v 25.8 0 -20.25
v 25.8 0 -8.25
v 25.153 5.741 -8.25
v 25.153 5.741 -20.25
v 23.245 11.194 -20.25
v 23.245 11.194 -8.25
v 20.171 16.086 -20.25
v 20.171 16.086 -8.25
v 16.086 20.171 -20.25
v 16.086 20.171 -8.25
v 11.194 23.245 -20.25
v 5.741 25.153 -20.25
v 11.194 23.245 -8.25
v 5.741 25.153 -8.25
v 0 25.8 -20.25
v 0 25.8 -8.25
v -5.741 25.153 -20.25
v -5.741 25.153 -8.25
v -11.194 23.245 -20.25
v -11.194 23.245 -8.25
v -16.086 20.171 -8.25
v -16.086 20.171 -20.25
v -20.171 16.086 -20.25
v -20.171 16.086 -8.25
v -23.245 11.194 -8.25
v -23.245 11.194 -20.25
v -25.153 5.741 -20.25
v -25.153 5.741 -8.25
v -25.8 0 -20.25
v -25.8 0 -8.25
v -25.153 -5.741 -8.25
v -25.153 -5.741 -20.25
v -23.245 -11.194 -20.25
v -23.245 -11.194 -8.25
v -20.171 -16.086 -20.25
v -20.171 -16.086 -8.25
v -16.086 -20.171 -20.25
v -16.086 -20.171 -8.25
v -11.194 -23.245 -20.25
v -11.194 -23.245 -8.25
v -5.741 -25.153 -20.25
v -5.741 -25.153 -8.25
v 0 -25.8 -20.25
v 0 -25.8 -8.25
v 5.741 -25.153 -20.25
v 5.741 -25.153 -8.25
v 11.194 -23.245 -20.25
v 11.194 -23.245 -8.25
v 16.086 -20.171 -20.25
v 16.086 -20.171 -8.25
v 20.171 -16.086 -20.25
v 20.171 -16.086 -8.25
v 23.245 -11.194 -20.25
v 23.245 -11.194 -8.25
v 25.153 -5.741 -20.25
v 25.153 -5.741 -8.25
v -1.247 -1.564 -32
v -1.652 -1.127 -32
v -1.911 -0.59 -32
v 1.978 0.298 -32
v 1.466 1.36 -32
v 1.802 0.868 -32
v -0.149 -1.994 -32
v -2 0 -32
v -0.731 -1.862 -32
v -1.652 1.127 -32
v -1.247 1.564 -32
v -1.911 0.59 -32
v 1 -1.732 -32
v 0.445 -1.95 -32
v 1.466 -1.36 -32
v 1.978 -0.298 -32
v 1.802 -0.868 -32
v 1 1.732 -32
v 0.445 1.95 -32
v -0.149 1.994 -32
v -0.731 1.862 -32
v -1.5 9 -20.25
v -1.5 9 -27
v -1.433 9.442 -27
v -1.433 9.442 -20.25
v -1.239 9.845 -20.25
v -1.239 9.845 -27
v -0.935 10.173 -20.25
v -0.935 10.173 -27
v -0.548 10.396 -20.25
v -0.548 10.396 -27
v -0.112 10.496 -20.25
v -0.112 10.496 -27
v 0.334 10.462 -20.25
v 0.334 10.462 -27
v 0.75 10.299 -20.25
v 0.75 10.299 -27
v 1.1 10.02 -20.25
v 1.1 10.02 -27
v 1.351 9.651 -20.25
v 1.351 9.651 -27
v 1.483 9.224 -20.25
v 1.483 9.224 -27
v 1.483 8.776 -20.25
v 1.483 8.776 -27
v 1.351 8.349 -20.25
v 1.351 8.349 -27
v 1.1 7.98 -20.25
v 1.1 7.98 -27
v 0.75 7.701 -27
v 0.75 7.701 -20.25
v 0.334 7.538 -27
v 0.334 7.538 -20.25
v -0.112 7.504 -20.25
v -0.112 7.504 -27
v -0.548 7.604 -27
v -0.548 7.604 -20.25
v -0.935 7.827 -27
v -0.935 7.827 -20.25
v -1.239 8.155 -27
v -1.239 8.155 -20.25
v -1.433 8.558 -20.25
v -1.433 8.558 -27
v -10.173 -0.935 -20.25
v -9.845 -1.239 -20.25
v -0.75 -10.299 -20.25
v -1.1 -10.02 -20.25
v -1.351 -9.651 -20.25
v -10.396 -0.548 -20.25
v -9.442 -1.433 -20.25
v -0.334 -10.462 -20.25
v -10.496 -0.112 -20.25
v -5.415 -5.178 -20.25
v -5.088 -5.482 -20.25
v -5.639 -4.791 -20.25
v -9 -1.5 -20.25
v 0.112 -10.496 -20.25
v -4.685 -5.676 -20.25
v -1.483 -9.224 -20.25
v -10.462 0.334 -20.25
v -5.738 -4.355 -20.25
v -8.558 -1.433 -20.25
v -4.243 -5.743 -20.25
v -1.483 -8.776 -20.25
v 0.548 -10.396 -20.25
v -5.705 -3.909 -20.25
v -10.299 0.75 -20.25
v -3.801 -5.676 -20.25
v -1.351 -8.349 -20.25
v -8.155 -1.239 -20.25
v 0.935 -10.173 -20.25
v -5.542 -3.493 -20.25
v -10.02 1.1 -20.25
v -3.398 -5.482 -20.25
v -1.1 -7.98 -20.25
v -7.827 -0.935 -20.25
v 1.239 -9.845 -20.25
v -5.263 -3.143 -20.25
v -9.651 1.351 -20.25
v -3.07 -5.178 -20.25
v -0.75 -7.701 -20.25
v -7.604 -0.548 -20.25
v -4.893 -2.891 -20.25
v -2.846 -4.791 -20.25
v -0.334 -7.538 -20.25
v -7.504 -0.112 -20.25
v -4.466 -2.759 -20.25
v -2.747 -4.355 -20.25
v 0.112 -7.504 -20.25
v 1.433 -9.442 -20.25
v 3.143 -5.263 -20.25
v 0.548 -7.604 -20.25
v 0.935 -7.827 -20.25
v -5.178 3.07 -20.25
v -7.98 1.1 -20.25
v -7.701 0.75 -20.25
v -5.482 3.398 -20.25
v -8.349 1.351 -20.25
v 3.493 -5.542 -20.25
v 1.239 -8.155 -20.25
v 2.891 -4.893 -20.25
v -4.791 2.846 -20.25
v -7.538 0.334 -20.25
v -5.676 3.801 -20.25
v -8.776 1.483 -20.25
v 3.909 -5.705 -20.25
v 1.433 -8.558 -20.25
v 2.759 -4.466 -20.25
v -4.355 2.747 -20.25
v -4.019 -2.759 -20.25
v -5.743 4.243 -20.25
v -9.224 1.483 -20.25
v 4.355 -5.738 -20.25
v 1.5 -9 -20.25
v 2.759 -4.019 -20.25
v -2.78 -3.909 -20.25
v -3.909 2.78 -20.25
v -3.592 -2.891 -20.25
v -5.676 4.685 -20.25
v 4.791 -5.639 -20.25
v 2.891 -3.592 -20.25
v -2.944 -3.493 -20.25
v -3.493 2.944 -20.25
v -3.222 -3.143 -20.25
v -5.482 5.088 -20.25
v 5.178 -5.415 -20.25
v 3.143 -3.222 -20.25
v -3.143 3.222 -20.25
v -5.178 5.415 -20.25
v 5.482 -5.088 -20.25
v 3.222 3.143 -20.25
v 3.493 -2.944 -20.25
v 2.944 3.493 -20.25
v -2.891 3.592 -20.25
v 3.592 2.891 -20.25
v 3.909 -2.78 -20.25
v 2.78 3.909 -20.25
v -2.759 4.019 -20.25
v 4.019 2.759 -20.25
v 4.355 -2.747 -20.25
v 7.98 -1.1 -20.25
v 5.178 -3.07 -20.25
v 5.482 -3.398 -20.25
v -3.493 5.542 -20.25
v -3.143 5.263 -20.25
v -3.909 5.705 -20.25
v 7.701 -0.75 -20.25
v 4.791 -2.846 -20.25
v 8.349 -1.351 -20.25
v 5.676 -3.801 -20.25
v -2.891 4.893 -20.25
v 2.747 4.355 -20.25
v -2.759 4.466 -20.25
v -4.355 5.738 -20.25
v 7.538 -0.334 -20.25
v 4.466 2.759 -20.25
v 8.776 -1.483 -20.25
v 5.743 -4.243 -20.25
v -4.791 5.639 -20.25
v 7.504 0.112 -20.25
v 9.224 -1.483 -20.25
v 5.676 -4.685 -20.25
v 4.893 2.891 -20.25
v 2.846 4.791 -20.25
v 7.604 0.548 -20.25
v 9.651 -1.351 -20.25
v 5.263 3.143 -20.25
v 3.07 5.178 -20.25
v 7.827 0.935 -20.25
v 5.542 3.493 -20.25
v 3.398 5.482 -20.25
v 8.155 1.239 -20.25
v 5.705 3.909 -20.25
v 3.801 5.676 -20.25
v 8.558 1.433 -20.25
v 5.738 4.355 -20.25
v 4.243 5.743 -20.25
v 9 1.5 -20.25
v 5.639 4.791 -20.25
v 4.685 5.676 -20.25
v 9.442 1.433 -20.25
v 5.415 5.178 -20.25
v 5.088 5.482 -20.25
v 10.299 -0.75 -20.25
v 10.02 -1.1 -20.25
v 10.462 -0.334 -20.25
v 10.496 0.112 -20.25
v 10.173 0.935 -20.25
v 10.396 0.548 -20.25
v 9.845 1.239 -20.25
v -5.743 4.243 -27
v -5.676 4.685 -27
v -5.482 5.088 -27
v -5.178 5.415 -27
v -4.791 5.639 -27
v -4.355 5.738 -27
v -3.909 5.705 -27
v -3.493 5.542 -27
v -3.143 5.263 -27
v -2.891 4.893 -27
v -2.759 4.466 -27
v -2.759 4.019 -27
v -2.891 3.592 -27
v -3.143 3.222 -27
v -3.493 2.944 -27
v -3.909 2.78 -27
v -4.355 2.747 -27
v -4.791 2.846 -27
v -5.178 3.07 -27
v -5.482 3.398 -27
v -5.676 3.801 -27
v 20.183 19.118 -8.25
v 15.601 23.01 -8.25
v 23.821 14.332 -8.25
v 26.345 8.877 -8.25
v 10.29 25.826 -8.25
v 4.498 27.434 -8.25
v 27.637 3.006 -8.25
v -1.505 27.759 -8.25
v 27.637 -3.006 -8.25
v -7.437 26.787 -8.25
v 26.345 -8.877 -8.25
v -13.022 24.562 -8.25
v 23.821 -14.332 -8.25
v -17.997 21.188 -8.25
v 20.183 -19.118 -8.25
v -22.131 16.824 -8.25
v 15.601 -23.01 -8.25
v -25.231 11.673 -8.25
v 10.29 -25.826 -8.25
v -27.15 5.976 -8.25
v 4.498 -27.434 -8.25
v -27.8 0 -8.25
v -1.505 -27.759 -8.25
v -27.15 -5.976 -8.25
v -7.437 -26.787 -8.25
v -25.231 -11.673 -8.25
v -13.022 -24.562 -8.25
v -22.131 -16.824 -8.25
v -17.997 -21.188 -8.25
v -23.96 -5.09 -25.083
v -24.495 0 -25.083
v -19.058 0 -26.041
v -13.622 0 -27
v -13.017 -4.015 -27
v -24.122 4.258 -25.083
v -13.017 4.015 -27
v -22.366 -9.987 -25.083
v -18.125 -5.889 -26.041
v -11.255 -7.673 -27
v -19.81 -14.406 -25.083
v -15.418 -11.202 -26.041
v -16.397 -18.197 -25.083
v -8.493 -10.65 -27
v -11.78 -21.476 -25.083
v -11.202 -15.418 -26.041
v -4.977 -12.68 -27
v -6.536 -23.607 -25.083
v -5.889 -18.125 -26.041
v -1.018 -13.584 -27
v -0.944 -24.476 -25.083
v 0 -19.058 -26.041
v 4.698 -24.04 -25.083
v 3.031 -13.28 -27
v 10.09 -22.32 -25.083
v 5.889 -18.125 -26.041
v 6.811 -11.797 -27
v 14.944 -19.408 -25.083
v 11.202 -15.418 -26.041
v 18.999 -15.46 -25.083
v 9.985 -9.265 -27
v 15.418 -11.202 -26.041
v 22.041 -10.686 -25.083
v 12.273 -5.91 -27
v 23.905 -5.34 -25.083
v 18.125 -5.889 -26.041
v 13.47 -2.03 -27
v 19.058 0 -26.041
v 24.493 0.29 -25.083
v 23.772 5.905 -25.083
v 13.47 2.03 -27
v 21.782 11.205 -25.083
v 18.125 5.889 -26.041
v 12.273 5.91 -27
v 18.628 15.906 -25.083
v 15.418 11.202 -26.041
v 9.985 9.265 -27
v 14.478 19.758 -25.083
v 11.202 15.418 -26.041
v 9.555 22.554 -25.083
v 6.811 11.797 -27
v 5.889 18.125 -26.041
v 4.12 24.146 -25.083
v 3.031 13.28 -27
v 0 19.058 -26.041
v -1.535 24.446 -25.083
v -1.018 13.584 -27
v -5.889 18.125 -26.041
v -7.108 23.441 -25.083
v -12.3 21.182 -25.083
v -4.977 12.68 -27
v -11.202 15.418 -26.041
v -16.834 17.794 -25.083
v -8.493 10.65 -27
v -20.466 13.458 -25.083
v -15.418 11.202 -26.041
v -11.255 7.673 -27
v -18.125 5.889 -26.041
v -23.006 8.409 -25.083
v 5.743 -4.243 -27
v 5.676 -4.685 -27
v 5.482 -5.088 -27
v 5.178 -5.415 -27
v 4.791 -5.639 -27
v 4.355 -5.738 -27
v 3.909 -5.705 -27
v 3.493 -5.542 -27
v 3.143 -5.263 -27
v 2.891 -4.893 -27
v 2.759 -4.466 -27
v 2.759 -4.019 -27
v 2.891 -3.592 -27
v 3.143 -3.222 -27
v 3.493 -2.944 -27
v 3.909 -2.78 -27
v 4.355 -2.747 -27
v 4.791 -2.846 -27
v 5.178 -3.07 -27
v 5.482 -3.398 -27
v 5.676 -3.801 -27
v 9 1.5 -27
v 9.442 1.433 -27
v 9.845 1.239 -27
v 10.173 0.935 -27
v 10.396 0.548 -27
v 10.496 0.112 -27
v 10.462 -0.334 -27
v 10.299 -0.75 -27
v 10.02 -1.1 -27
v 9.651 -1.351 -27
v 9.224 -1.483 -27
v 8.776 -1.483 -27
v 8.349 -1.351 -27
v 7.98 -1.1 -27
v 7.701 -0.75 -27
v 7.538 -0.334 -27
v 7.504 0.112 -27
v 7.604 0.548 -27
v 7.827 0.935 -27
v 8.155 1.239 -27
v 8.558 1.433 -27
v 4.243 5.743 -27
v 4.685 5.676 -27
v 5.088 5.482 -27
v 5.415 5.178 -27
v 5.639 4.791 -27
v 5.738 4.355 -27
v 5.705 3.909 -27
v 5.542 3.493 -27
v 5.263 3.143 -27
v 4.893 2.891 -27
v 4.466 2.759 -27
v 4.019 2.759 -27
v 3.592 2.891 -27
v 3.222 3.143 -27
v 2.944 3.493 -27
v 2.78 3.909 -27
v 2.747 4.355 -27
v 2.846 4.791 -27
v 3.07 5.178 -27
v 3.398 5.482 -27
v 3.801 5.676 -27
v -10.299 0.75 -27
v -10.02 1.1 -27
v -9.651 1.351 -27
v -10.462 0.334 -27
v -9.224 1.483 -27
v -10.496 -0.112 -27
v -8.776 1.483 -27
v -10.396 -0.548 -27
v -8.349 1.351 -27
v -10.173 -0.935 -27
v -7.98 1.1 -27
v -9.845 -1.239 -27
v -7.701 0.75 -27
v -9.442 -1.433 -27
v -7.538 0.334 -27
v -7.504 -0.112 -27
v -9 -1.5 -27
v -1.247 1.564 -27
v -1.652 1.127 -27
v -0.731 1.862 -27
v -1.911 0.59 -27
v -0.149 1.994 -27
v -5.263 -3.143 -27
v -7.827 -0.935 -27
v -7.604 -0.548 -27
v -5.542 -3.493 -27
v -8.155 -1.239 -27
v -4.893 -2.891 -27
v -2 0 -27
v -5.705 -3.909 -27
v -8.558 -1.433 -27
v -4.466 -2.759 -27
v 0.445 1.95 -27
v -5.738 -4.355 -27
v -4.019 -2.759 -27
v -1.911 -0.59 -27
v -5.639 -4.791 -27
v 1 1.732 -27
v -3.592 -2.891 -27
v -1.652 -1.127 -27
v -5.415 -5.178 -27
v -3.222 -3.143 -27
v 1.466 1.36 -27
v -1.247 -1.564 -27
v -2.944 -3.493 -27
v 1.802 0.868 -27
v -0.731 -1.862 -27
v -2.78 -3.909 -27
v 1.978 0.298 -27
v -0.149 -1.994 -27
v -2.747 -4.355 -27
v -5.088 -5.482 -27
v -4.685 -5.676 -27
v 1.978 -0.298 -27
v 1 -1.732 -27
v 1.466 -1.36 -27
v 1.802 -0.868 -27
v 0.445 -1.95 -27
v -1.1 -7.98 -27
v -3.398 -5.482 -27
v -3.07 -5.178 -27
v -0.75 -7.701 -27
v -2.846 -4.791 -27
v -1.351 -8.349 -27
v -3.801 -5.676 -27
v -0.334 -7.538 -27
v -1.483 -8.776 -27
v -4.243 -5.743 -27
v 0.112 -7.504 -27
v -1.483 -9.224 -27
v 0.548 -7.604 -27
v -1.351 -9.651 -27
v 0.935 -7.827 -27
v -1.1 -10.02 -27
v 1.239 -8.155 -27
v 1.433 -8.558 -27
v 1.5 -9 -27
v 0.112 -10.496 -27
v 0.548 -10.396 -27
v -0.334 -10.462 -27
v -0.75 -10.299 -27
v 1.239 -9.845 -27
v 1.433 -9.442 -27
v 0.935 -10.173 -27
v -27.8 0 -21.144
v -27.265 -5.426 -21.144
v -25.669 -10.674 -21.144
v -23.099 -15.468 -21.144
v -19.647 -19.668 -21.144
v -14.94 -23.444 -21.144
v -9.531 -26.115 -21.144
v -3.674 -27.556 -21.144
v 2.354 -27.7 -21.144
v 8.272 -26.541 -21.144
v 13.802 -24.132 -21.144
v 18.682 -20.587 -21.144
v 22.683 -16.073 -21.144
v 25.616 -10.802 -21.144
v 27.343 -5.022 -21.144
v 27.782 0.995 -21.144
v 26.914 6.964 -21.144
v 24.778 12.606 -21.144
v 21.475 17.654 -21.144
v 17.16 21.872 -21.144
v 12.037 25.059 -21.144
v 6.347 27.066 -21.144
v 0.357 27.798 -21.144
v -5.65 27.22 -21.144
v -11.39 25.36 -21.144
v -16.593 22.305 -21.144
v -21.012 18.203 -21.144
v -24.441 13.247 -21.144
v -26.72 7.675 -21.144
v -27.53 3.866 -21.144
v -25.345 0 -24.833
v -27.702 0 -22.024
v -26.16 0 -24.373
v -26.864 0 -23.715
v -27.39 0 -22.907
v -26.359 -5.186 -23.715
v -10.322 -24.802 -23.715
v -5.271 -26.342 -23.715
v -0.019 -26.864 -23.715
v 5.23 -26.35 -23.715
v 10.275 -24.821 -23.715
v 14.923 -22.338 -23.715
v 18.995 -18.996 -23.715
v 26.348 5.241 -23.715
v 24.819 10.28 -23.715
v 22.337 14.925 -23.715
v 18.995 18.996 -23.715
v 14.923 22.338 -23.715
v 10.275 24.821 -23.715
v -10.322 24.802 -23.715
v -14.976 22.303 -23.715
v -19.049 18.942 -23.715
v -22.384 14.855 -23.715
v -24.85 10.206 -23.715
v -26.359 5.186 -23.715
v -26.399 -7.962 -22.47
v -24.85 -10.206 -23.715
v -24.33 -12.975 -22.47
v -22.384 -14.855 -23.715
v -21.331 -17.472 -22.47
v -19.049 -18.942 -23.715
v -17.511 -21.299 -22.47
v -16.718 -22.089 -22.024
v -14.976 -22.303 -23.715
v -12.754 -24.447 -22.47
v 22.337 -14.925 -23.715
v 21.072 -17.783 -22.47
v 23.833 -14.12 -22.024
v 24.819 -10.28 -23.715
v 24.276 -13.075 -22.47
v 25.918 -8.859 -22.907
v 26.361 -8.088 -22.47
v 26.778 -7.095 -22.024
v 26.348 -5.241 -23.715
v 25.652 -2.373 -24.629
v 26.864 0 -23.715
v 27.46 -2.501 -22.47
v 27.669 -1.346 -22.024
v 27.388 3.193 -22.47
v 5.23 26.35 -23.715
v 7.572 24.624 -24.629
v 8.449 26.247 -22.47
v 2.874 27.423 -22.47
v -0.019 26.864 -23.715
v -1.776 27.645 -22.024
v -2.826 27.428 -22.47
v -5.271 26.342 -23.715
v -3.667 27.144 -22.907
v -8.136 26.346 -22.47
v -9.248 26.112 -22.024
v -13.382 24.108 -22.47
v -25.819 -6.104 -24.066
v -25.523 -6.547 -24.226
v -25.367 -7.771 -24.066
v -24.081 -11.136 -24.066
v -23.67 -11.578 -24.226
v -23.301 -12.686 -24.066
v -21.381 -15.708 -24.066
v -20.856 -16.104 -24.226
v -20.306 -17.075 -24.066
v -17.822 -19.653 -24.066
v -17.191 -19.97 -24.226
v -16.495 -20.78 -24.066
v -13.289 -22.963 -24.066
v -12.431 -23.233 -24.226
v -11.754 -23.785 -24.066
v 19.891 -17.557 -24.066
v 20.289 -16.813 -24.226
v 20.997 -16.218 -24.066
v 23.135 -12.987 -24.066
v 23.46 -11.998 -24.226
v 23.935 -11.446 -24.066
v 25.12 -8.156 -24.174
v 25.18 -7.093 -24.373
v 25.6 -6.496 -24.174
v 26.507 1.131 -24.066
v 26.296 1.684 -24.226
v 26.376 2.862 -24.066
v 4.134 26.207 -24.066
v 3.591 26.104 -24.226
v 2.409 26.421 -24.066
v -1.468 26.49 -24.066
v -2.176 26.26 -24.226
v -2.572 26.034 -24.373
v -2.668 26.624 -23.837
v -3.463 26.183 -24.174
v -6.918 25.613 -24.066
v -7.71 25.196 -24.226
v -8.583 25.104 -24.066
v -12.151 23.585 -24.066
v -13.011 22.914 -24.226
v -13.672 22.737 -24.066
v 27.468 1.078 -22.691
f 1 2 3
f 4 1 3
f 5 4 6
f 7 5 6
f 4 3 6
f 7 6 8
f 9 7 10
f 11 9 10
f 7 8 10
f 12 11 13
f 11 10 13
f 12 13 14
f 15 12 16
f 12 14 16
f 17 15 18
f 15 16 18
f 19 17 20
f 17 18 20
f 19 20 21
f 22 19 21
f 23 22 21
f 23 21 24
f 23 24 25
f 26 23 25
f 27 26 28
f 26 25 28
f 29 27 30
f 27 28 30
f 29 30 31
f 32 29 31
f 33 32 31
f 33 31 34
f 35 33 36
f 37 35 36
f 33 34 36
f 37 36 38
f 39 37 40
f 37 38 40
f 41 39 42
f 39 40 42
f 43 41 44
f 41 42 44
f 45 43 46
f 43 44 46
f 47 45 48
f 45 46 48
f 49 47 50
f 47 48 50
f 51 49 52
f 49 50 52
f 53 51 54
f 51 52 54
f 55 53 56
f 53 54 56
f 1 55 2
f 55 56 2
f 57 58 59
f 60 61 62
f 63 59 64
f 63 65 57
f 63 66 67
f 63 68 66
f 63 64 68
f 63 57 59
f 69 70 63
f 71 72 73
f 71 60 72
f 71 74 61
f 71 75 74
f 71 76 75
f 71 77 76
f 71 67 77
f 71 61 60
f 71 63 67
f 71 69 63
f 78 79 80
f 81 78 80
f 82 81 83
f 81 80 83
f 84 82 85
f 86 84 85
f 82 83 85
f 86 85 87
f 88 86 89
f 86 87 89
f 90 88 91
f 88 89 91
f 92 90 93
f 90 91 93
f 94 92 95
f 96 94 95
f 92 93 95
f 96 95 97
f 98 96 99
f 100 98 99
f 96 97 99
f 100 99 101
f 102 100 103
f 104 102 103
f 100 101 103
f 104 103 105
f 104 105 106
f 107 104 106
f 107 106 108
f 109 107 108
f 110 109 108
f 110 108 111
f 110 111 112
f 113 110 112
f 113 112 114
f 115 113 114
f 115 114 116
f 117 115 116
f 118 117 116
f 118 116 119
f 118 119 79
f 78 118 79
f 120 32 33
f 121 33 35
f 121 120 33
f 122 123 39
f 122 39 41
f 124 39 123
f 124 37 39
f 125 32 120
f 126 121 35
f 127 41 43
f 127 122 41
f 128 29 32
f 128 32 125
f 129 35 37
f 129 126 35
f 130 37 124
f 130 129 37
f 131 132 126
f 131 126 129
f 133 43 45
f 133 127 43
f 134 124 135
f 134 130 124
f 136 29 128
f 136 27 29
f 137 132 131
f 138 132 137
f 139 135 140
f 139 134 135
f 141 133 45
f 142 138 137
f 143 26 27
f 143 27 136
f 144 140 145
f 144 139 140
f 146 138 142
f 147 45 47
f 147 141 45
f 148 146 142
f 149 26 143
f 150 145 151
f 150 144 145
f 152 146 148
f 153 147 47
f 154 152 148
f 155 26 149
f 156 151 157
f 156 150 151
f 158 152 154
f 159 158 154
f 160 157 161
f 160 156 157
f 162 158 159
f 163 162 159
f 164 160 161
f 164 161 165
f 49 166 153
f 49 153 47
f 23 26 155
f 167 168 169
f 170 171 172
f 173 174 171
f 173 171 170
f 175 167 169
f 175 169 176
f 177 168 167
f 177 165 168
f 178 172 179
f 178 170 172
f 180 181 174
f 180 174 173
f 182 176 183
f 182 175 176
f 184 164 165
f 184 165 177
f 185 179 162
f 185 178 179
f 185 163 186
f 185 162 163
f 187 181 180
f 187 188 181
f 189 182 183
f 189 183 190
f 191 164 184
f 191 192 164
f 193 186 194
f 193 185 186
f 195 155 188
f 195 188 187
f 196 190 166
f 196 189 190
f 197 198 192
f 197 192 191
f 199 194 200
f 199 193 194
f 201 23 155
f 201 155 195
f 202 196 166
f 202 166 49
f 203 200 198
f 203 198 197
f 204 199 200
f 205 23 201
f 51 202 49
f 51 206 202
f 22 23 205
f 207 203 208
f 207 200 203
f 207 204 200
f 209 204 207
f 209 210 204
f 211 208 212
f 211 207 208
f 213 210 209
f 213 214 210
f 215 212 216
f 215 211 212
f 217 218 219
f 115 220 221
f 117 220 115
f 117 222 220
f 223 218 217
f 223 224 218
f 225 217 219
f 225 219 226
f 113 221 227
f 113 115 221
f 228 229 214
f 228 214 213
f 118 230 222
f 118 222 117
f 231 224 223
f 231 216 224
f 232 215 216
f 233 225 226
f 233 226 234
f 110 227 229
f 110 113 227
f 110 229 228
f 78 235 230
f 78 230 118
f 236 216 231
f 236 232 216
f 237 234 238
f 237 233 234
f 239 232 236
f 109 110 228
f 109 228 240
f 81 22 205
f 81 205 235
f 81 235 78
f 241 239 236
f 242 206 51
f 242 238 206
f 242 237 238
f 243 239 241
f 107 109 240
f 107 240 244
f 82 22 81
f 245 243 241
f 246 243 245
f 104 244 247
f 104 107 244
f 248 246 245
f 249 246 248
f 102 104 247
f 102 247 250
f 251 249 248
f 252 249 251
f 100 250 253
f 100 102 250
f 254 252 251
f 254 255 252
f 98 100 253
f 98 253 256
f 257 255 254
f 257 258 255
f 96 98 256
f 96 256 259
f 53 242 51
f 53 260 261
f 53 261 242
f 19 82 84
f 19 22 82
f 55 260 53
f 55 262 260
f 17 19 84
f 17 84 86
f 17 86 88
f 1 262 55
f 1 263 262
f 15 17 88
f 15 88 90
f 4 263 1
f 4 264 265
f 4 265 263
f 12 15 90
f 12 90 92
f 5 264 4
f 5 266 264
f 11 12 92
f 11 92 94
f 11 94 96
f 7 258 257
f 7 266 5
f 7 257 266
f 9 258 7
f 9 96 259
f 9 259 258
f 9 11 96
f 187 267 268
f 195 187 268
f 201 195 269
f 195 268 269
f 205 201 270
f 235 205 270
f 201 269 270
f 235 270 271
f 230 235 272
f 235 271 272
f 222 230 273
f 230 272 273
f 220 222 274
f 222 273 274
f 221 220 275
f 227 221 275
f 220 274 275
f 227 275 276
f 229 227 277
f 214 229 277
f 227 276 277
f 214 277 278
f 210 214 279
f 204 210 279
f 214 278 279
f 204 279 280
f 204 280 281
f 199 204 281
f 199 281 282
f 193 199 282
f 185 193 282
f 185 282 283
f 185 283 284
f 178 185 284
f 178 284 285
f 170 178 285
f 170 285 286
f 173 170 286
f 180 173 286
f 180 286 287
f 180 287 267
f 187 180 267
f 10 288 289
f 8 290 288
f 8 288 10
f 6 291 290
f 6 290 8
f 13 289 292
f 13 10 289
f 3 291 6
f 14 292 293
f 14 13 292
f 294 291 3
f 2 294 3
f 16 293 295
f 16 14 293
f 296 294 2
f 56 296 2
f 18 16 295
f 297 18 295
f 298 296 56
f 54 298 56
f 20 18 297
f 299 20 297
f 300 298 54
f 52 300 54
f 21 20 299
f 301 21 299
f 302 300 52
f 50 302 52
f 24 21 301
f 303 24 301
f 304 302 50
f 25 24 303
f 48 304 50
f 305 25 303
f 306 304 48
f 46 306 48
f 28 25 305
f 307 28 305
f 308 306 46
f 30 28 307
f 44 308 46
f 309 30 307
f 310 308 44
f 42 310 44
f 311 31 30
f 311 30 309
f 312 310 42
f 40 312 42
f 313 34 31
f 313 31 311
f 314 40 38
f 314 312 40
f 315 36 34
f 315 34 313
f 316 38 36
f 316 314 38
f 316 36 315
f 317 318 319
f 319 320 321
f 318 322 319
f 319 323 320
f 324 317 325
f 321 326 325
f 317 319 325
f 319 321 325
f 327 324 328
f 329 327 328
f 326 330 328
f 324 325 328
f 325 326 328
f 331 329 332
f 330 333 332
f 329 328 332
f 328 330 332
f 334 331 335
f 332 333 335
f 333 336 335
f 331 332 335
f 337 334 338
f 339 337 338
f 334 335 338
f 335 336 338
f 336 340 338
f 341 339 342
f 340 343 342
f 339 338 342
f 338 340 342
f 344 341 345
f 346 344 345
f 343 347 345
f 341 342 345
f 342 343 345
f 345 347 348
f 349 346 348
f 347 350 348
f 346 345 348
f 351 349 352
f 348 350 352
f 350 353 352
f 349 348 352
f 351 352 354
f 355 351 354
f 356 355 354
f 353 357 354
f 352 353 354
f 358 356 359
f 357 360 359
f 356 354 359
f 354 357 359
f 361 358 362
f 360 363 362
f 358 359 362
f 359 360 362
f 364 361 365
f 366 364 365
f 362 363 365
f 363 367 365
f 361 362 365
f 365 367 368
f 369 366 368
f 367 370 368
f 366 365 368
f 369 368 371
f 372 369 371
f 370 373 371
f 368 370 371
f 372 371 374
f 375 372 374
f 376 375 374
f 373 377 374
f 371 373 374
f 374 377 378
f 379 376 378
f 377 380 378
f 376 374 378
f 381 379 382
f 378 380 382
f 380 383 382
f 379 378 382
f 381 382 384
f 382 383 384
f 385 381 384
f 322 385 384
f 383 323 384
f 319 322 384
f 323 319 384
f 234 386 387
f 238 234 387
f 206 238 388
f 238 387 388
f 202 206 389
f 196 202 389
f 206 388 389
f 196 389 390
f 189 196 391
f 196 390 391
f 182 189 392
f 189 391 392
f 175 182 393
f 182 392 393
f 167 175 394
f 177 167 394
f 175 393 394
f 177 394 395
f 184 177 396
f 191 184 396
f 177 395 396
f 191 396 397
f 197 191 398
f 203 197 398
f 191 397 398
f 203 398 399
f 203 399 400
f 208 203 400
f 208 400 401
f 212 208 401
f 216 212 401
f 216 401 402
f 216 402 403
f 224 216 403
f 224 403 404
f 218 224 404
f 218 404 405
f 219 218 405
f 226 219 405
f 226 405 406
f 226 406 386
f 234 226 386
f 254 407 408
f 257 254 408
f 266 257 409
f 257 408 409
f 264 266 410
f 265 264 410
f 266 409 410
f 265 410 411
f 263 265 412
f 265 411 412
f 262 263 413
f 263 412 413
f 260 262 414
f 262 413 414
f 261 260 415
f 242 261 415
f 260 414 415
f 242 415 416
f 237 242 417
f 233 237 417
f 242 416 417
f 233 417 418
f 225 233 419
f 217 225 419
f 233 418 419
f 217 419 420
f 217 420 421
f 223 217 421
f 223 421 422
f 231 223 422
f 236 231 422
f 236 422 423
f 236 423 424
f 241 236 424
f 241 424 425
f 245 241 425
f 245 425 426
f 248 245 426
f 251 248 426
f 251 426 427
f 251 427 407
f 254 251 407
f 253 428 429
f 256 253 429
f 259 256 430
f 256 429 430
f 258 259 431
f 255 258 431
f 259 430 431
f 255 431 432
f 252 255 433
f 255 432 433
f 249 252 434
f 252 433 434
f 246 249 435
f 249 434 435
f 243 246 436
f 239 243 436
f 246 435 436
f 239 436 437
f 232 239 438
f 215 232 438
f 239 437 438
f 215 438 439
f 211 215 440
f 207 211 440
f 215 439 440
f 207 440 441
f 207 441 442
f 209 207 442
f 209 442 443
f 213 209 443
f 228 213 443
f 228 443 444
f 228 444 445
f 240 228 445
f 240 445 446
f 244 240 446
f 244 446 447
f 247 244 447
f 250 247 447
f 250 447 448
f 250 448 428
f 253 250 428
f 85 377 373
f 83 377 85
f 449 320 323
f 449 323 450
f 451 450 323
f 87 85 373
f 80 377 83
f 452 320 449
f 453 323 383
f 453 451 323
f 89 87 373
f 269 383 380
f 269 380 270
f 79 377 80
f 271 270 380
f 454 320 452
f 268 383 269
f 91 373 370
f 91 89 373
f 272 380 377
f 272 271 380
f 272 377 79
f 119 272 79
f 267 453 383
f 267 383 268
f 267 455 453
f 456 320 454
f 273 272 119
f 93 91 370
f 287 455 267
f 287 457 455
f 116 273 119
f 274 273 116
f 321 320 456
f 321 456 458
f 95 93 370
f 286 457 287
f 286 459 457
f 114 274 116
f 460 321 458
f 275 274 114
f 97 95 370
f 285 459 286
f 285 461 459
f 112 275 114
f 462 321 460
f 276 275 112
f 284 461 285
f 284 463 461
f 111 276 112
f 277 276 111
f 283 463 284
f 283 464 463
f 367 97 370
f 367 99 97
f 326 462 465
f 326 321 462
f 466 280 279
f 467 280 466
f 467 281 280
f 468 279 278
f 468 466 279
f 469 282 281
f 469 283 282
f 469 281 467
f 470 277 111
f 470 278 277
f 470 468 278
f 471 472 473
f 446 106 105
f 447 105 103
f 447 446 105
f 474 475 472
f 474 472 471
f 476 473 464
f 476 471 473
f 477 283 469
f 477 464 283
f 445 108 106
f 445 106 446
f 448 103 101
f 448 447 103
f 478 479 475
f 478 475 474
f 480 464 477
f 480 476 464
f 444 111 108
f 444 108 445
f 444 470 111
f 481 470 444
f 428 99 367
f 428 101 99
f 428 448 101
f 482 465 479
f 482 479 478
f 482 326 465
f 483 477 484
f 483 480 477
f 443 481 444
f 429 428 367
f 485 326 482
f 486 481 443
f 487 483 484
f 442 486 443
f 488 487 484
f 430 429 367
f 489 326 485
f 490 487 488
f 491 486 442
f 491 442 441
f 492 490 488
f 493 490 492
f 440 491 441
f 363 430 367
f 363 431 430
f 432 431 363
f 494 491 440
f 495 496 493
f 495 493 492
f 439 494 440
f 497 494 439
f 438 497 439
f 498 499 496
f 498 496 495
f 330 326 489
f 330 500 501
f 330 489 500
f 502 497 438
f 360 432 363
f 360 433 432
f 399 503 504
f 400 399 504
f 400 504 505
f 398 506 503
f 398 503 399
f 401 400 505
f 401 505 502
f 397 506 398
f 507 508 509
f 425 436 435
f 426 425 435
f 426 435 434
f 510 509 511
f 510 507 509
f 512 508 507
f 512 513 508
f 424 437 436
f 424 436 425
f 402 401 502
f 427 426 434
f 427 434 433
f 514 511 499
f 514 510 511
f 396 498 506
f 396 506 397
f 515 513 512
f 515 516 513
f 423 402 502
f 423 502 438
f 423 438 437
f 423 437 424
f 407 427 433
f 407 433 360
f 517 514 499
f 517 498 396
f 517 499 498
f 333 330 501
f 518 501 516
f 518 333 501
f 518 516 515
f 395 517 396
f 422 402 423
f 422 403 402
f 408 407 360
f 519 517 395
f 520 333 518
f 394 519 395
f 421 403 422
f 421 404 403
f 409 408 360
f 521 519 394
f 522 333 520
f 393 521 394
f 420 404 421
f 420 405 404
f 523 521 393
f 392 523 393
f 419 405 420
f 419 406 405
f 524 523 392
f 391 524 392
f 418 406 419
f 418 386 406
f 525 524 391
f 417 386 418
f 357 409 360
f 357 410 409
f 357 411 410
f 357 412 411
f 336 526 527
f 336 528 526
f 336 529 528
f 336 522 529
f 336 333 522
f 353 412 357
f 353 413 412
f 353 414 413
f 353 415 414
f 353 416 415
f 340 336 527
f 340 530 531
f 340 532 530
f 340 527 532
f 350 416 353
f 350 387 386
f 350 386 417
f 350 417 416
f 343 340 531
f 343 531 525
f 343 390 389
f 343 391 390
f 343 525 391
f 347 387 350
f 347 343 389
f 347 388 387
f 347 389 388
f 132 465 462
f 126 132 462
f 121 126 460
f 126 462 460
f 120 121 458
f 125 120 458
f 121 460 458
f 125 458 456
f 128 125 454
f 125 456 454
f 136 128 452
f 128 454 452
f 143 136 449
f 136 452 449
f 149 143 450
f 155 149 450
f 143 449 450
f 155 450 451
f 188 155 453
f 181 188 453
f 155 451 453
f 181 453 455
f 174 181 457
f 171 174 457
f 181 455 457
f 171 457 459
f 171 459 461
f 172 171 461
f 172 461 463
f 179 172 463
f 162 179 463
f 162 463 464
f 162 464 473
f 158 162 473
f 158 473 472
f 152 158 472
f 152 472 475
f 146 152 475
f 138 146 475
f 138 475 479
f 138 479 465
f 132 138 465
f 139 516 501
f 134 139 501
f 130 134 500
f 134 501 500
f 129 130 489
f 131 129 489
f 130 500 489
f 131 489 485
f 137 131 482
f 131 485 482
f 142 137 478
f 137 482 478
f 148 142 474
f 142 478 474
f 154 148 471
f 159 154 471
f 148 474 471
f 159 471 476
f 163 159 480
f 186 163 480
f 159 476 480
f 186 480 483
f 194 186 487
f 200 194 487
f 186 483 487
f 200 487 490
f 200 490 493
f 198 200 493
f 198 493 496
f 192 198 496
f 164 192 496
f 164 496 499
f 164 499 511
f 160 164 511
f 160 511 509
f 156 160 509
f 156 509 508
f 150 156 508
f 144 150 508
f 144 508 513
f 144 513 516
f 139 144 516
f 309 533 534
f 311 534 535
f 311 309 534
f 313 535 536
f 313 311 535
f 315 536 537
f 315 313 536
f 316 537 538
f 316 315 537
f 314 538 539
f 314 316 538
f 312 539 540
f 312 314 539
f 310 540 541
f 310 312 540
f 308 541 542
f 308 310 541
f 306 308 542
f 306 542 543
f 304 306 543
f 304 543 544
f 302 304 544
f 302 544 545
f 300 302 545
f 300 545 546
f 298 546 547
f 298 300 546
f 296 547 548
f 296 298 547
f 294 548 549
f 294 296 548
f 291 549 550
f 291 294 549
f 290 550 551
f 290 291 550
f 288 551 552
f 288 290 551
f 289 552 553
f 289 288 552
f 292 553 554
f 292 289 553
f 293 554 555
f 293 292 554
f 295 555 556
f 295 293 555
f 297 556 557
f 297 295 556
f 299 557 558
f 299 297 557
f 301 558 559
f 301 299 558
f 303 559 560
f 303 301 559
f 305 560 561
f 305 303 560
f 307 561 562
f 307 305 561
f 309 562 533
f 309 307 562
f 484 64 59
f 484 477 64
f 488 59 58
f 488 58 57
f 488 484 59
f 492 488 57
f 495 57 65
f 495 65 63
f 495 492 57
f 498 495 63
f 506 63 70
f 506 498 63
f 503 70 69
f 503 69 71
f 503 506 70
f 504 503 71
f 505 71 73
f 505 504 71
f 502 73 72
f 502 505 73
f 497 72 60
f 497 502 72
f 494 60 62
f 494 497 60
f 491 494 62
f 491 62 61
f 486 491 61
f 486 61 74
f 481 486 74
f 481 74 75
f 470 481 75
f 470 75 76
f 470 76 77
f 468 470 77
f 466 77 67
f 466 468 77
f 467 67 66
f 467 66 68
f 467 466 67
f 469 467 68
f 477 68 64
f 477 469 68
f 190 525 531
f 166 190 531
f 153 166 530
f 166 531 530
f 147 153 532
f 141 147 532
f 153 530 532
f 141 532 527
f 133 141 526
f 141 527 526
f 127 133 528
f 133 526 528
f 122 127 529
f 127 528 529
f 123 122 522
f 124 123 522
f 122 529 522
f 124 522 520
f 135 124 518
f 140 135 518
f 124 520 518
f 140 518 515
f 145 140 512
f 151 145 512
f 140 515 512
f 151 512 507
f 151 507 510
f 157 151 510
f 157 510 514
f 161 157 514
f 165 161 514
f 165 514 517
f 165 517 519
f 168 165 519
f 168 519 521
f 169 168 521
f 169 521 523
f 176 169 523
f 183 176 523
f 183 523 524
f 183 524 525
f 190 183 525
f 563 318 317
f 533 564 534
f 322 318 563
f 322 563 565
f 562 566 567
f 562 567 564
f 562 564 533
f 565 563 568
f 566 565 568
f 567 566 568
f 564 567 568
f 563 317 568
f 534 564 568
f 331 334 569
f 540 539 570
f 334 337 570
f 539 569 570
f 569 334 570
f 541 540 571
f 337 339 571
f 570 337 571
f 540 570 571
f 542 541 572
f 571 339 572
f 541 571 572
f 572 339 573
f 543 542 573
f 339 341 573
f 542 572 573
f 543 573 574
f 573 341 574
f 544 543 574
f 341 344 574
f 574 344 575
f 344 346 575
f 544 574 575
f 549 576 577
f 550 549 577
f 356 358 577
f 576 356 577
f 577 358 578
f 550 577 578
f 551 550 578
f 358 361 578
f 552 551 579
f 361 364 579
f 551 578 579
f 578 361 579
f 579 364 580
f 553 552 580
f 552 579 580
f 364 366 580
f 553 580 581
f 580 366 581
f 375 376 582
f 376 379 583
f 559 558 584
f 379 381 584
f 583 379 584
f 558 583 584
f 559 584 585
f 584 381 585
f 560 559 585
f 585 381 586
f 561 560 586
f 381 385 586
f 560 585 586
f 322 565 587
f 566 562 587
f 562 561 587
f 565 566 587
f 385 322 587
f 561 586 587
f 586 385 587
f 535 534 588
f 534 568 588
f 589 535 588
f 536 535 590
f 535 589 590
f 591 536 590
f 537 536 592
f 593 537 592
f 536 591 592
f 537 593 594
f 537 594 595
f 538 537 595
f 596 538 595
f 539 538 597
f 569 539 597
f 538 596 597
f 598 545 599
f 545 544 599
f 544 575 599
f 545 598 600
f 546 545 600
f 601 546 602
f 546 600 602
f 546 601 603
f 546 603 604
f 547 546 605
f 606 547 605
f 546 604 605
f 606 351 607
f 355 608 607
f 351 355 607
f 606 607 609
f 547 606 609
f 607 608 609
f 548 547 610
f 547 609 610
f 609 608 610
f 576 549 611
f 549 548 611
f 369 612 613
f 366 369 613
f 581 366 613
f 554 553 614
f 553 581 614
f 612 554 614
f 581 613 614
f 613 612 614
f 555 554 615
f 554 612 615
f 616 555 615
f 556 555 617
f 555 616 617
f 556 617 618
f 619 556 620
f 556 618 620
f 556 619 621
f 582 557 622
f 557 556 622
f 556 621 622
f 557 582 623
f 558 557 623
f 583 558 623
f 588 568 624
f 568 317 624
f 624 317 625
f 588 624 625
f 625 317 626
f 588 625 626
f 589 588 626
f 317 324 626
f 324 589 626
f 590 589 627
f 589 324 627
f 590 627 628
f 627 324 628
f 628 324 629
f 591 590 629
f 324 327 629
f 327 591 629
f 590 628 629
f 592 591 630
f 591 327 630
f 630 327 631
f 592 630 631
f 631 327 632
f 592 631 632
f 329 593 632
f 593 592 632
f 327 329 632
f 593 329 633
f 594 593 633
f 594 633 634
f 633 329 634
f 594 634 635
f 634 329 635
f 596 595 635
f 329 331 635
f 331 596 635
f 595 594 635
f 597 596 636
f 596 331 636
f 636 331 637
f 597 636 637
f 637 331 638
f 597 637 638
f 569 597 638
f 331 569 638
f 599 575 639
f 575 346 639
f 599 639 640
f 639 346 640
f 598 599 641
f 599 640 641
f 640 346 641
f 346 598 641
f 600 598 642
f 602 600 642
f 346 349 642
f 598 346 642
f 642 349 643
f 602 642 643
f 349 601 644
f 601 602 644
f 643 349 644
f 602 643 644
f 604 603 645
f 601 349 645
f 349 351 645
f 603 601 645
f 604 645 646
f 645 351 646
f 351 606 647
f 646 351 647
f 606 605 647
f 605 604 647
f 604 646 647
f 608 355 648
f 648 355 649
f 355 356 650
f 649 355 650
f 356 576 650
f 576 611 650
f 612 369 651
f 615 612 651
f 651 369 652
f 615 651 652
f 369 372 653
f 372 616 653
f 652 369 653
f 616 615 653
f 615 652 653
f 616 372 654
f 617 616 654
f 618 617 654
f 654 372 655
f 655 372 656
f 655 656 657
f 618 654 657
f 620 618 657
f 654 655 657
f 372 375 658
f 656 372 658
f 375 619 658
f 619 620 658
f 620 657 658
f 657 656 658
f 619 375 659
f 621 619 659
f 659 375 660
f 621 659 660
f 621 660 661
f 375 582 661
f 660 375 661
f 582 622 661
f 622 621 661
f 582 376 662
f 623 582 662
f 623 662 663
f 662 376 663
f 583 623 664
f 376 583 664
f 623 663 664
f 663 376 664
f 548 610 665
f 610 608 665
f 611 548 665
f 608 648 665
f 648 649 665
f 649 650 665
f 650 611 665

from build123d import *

# Parameters (mm, degrees)
SKETCH3_R          = 1.5
CUT_EXTRUDE1_DEPTH = 19.75
CIRPATTERN1_COUNT  = 4
CHAMFER1_SIZE      = 2.5
CHAMFER1_SIZE2     = 14.178204549
FILLET1_R          = 4
SKETCH4_R          = 25.8
CUT_EXTRUDE2_DEPTH = 12


with BuildPart() as part:
    # Sketch2 → Revolve1 (revolve)
    with BuildSketch(Plane(origin=(0, 0, 0), x_dir=(1, 0, 0), z_dir=(0, 1, 0))):
        Polygon((0, 32), (-2, 32), (-2, 27), (-27.8, 27), (-27.8, 8.25), (0, 8.25), align=None)
    revolve(axis=Axis((0, 0, -88.99), (0, 0, 1)))

    # Sketch3 → Cut-Extrude1 (cut, through all)
    with BuildSketch(Plane(origin=(0, 0, -27), x_dir=(-1, 0, 0), z_dir=(0, 0, -1))):
        with Locations((0, 9)):
            Circle(SKETCH3_R)
        with Locations((4.242640687, 4.242640687)):
            Circle(SKETCH3_R)
    cut_extrude1 = extrude(amount=-CUT_EXTRUDE1_DEPTH, mode=Mode.SUBTRACT)

    # CirPattern1: Cut-Extrude1 ×4 about axis
    cirpattern1_axis = Axis((0, 0, 0), (0, 0, 1))
    for i in range(1, CIRPATTERN1_COUNT):
        add(cut_extrude1.rotate(cirpattern1_axis, i * 360 / CIRPATTERN1_COUNT), mode=Mode.SUBTRACT)

    # Chamfer1
    chamfer1_edges = [part.edges().sort_by_distance(p)[0] for p in [
        (27.8, 0, -27),
    ]]
    chamfer1_side = [part.faces().sort_by_distance(p)[0] for p in [
        (27.8, 0, -17.625),
    ]]
    chamfer(chamfer1_edges, length=CHAMFER1_SIZE, length2=CHAMFER1_SIZE2, reference=chamfer1_side[0])

    # Fillet1
    fillet1_edges = [part.edges().sort_by_distance(p)[0] for p in [
        (27.8, 0, -24.5),
    ]]
    fillet(fillet1_edges, radius=FILLET1_R)

    # Sketch4 → Cut-Extrude2 (cut)
    with BuildSketch(Plane.XY.offset(-8.25)):
        Circle(SKETCH4_R)
    extrude(amount=-CUT_EXTRUDE2_DEPTH, mode=Mode.SUBTRACT)


solid = part.part
